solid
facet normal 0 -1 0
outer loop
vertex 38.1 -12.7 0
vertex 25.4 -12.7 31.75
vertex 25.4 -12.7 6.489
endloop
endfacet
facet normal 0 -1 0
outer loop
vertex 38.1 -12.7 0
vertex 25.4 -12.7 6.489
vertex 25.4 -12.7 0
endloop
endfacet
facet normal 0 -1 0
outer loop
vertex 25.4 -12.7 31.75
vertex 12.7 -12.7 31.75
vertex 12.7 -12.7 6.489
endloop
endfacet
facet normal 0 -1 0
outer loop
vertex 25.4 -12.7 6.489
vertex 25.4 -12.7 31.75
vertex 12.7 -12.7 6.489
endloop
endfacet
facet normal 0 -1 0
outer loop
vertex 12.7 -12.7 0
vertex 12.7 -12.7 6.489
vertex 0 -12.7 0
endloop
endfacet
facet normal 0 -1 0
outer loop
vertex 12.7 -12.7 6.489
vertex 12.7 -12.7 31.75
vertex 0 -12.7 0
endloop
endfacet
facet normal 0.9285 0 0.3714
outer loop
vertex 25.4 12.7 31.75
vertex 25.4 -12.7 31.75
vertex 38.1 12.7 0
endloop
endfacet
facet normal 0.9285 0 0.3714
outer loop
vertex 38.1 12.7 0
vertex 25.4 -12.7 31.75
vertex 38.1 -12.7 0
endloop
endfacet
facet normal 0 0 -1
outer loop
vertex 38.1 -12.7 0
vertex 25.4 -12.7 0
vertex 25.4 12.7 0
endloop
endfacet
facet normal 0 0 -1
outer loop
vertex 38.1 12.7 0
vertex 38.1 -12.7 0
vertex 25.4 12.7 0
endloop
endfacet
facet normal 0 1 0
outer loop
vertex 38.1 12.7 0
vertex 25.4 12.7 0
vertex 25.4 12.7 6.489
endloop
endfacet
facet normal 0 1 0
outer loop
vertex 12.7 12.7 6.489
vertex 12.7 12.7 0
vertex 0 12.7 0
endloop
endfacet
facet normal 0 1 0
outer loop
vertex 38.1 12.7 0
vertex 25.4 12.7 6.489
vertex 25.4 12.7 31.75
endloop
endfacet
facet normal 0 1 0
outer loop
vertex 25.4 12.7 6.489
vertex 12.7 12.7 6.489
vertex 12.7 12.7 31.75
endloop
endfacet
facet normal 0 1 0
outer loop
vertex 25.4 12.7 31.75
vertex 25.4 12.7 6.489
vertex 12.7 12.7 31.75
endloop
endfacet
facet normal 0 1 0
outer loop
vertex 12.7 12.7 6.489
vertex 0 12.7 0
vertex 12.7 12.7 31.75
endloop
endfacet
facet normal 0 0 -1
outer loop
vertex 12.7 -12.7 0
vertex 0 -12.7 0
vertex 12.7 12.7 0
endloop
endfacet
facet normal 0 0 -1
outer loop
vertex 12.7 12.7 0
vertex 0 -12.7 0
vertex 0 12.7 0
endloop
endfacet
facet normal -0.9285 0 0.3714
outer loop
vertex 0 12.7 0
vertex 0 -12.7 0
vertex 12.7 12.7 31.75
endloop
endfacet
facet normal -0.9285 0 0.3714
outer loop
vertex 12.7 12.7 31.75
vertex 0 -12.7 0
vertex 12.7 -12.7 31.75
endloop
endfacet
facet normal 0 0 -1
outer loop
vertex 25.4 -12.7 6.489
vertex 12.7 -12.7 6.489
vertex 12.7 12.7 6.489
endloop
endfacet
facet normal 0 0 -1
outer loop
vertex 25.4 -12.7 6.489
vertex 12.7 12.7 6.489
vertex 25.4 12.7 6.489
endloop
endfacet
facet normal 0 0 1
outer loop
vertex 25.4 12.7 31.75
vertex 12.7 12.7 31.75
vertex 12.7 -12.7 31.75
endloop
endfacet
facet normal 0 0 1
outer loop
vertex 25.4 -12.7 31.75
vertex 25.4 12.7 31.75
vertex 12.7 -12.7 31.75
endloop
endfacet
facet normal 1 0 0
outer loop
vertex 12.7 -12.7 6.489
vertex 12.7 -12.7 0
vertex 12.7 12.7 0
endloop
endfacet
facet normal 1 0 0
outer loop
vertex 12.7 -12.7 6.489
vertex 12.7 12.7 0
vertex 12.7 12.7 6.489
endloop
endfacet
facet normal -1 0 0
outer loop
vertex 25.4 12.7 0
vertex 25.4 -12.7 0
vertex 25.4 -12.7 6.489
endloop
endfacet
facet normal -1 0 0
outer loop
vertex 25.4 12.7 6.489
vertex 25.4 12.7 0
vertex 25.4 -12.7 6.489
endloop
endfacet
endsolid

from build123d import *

# Parameters (mm, degrees)
F1_DEPTH = 38.1
F3_DEPTH = 25.401
F4_W     = 12.7
F4_H     = 6.48937
F5_DEPTH = 25.401


with BuildPart() as f1:
    # F0 (on Right) → F1 (new body)
    with BuildSketch(Plane.YZ):
        Polygon((-12.7, 31.75), (-12.7, 0), (0, 0), (12.7, 0), (12.7, 31.75), align=None)
    extrude(amount=F1_DEPTH)

    # F2 (on face) → F3 (cut, through all)
    with BuildSketch(Plane.XZ.offset(12.7)):
        Polygon((0, 31.75), (0, 0), (12.7, 31.75), align=None)
        Polygon((25.4, 31.75), (38.1, 0), (38.1, 31.75), align=None)
    extrude(amount=-F3_DEPTH, mode=Mode.SUBTRACT)

    # F4 (on face) → F5 (cut, through all)
    with BuildSketch(Plane.XZ.offset(12.7)):
        with Locations((19.05, 3.244685)):
            Rectangle(F4_W, F4_H)
    extrude(amount=-F5_DEPTH, mode=Mode.SUBTRACT)


solid = f1.part
